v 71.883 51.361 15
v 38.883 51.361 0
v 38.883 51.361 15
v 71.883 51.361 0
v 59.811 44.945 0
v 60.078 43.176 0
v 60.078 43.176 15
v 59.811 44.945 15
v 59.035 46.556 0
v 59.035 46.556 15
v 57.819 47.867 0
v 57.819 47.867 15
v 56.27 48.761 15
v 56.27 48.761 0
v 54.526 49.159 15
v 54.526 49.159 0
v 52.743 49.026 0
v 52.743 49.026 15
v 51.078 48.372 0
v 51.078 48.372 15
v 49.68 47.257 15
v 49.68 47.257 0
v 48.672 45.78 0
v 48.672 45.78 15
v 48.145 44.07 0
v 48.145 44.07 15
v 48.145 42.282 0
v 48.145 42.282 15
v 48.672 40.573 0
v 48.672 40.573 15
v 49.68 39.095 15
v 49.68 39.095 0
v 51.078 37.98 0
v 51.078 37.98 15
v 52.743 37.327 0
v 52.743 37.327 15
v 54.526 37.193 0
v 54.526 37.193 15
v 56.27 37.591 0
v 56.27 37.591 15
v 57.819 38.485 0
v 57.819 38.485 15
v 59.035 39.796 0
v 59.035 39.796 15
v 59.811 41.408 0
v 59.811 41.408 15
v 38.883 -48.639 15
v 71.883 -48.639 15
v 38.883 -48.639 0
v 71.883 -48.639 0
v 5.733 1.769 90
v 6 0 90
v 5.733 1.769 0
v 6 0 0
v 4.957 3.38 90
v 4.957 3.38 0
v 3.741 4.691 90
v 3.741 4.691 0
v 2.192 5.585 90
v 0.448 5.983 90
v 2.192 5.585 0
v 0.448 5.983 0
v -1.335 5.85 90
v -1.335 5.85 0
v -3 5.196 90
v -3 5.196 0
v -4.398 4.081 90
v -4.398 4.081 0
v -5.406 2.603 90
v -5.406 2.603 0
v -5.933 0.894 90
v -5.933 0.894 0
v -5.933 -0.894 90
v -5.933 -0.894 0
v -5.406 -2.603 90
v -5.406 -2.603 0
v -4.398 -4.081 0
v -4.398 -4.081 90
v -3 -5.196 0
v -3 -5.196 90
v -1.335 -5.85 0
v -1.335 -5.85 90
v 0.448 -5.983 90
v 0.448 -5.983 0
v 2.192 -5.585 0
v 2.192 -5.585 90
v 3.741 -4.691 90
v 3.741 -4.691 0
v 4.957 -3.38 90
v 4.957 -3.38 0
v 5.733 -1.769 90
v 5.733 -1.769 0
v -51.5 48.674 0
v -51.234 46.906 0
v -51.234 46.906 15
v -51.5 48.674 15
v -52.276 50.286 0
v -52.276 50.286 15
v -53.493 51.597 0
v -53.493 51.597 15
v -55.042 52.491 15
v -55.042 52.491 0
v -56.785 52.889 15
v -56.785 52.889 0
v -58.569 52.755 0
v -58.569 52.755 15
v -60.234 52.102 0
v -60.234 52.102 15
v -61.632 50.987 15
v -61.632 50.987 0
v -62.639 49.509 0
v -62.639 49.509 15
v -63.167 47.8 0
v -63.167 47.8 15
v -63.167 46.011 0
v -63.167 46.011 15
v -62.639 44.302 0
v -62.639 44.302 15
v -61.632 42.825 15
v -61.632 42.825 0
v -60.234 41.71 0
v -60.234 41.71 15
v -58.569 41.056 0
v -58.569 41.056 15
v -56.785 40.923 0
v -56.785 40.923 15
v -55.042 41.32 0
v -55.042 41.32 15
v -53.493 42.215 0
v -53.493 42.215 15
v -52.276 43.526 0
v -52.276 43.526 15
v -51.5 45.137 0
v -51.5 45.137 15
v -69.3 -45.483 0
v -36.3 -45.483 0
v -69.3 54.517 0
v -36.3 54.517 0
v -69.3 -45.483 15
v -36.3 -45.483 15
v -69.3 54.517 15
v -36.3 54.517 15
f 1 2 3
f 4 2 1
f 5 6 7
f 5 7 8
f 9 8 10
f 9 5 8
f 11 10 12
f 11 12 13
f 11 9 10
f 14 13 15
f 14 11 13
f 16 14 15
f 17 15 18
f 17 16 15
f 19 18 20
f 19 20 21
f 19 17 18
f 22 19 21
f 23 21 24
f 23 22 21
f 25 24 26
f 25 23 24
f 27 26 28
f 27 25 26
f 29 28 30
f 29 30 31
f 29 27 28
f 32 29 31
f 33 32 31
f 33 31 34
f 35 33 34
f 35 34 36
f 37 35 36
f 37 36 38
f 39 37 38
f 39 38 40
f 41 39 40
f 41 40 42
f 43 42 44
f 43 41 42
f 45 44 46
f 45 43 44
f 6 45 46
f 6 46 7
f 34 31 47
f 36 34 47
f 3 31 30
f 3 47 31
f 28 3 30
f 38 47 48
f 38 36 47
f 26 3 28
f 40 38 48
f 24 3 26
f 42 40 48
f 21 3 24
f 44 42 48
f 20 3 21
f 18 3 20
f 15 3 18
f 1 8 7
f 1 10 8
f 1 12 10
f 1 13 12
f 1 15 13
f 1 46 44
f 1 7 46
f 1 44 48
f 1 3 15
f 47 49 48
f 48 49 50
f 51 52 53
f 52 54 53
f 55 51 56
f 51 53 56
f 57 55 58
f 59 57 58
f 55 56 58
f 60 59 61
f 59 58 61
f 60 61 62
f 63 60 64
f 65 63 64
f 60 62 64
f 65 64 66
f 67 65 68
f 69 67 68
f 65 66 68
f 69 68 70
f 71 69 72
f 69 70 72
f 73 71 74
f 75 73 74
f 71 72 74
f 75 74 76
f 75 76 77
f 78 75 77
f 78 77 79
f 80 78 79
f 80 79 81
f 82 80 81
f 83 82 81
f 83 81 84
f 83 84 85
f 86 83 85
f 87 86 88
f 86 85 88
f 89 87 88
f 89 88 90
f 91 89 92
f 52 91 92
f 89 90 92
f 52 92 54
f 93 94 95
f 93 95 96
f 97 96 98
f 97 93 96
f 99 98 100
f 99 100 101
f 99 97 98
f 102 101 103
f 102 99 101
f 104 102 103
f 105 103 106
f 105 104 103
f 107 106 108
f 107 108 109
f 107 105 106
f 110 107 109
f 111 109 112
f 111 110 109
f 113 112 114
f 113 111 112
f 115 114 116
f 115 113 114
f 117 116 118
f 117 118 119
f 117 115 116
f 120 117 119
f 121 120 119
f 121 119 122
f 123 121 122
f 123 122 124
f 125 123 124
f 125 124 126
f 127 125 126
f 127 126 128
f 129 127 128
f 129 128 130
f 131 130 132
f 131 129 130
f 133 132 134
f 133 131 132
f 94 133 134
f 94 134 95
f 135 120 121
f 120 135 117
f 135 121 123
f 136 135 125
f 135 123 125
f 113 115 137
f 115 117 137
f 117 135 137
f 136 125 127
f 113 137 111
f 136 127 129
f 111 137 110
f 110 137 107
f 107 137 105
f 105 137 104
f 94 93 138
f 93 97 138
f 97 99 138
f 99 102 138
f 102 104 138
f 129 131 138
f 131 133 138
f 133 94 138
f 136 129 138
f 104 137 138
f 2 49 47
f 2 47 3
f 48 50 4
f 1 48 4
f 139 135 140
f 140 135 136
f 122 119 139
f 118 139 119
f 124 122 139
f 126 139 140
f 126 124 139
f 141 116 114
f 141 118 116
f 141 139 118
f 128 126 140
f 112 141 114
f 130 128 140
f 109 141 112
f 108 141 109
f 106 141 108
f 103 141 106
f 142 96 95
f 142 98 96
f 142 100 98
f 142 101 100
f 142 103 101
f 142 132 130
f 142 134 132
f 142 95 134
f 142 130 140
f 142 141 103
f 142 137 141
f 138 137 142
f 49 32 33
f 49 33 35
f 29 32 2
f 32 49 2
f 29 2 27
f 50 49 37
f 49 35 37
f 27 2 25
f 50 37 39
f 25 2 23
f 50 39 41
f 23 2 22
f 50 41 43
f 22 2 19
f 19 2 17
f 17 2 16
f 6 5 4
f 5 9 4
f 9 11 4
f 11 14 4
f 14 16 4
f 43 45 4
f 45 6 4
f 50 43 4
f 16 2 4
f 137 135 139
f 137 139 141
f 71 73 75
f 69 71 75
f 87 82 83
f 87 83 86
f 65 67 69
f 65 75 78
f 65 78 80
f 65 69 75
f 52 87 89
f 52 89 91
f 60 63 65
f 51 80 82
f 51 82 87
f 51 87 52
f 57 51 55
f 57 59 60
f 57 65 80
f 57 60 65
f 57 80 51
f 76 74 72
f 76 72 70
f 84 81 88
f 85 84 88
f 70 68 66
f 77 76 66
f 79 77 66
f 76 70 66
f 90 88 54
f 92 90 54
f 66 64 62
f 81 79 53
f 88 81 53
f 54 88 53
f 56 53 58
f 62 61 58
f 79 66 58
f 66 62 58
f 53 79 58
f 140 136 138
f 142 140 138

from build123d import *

# Parameters (mm, degrees)
F0_W     = 33
F0_H     = 100
F0_R     = 6
F1_DEPTH = 15
F3_DEPTH = 75


# Not quite as in the source:
# - the program builds the solid bodies; features that only make, move or delete a surface that nothing else refers to are left out


with BuildPart() as f1:
    # F0 (on Top) → F1 (new body)
    with BuildSketch(Plane.XY):
        with Locations((-52.8000037262, 4.5173896843)):
            Rectangle(F0_W, F0_H)
        with Locations((-57.2336092591, 46.9057410955)):
            Circle(F0_R, mode=Mode.SUBTRACT)
    extrude(amount=F1_DEPTH)


with BuildPart() as f1b:
    # F0 (on Top) → F1, piece 2 (new body)
    with BuildSketch(Plane.XY):
        with Locations((55.3826065895, 1.3608676211)):
            Rectangle(F0_W, F0_H)
        with Locations((54.0778711438, 43.1762300432)):
            Circle(F0_R, mode=Mode.SUBTRACT)
    extrude(amount=F1_DEPTH)


with BuildPart() as f1c:
    # F0 (on Top) → F1, piece 3 (new body)
    with BuildSketch(Plane.XY):
        Circle(F0_R)
    extrude(amount=F1_DEPTH)

    # F3 (add): a face of the model
    f3_faces = [f1c.faces().sort_by_distance(p)[0] for p in [
        (0, 0, 15),
    ]]
    extrude(f3_faces, amount=F3_DEPTH)


solid = Compound([f1.part, f1b.part, f1c.part])
